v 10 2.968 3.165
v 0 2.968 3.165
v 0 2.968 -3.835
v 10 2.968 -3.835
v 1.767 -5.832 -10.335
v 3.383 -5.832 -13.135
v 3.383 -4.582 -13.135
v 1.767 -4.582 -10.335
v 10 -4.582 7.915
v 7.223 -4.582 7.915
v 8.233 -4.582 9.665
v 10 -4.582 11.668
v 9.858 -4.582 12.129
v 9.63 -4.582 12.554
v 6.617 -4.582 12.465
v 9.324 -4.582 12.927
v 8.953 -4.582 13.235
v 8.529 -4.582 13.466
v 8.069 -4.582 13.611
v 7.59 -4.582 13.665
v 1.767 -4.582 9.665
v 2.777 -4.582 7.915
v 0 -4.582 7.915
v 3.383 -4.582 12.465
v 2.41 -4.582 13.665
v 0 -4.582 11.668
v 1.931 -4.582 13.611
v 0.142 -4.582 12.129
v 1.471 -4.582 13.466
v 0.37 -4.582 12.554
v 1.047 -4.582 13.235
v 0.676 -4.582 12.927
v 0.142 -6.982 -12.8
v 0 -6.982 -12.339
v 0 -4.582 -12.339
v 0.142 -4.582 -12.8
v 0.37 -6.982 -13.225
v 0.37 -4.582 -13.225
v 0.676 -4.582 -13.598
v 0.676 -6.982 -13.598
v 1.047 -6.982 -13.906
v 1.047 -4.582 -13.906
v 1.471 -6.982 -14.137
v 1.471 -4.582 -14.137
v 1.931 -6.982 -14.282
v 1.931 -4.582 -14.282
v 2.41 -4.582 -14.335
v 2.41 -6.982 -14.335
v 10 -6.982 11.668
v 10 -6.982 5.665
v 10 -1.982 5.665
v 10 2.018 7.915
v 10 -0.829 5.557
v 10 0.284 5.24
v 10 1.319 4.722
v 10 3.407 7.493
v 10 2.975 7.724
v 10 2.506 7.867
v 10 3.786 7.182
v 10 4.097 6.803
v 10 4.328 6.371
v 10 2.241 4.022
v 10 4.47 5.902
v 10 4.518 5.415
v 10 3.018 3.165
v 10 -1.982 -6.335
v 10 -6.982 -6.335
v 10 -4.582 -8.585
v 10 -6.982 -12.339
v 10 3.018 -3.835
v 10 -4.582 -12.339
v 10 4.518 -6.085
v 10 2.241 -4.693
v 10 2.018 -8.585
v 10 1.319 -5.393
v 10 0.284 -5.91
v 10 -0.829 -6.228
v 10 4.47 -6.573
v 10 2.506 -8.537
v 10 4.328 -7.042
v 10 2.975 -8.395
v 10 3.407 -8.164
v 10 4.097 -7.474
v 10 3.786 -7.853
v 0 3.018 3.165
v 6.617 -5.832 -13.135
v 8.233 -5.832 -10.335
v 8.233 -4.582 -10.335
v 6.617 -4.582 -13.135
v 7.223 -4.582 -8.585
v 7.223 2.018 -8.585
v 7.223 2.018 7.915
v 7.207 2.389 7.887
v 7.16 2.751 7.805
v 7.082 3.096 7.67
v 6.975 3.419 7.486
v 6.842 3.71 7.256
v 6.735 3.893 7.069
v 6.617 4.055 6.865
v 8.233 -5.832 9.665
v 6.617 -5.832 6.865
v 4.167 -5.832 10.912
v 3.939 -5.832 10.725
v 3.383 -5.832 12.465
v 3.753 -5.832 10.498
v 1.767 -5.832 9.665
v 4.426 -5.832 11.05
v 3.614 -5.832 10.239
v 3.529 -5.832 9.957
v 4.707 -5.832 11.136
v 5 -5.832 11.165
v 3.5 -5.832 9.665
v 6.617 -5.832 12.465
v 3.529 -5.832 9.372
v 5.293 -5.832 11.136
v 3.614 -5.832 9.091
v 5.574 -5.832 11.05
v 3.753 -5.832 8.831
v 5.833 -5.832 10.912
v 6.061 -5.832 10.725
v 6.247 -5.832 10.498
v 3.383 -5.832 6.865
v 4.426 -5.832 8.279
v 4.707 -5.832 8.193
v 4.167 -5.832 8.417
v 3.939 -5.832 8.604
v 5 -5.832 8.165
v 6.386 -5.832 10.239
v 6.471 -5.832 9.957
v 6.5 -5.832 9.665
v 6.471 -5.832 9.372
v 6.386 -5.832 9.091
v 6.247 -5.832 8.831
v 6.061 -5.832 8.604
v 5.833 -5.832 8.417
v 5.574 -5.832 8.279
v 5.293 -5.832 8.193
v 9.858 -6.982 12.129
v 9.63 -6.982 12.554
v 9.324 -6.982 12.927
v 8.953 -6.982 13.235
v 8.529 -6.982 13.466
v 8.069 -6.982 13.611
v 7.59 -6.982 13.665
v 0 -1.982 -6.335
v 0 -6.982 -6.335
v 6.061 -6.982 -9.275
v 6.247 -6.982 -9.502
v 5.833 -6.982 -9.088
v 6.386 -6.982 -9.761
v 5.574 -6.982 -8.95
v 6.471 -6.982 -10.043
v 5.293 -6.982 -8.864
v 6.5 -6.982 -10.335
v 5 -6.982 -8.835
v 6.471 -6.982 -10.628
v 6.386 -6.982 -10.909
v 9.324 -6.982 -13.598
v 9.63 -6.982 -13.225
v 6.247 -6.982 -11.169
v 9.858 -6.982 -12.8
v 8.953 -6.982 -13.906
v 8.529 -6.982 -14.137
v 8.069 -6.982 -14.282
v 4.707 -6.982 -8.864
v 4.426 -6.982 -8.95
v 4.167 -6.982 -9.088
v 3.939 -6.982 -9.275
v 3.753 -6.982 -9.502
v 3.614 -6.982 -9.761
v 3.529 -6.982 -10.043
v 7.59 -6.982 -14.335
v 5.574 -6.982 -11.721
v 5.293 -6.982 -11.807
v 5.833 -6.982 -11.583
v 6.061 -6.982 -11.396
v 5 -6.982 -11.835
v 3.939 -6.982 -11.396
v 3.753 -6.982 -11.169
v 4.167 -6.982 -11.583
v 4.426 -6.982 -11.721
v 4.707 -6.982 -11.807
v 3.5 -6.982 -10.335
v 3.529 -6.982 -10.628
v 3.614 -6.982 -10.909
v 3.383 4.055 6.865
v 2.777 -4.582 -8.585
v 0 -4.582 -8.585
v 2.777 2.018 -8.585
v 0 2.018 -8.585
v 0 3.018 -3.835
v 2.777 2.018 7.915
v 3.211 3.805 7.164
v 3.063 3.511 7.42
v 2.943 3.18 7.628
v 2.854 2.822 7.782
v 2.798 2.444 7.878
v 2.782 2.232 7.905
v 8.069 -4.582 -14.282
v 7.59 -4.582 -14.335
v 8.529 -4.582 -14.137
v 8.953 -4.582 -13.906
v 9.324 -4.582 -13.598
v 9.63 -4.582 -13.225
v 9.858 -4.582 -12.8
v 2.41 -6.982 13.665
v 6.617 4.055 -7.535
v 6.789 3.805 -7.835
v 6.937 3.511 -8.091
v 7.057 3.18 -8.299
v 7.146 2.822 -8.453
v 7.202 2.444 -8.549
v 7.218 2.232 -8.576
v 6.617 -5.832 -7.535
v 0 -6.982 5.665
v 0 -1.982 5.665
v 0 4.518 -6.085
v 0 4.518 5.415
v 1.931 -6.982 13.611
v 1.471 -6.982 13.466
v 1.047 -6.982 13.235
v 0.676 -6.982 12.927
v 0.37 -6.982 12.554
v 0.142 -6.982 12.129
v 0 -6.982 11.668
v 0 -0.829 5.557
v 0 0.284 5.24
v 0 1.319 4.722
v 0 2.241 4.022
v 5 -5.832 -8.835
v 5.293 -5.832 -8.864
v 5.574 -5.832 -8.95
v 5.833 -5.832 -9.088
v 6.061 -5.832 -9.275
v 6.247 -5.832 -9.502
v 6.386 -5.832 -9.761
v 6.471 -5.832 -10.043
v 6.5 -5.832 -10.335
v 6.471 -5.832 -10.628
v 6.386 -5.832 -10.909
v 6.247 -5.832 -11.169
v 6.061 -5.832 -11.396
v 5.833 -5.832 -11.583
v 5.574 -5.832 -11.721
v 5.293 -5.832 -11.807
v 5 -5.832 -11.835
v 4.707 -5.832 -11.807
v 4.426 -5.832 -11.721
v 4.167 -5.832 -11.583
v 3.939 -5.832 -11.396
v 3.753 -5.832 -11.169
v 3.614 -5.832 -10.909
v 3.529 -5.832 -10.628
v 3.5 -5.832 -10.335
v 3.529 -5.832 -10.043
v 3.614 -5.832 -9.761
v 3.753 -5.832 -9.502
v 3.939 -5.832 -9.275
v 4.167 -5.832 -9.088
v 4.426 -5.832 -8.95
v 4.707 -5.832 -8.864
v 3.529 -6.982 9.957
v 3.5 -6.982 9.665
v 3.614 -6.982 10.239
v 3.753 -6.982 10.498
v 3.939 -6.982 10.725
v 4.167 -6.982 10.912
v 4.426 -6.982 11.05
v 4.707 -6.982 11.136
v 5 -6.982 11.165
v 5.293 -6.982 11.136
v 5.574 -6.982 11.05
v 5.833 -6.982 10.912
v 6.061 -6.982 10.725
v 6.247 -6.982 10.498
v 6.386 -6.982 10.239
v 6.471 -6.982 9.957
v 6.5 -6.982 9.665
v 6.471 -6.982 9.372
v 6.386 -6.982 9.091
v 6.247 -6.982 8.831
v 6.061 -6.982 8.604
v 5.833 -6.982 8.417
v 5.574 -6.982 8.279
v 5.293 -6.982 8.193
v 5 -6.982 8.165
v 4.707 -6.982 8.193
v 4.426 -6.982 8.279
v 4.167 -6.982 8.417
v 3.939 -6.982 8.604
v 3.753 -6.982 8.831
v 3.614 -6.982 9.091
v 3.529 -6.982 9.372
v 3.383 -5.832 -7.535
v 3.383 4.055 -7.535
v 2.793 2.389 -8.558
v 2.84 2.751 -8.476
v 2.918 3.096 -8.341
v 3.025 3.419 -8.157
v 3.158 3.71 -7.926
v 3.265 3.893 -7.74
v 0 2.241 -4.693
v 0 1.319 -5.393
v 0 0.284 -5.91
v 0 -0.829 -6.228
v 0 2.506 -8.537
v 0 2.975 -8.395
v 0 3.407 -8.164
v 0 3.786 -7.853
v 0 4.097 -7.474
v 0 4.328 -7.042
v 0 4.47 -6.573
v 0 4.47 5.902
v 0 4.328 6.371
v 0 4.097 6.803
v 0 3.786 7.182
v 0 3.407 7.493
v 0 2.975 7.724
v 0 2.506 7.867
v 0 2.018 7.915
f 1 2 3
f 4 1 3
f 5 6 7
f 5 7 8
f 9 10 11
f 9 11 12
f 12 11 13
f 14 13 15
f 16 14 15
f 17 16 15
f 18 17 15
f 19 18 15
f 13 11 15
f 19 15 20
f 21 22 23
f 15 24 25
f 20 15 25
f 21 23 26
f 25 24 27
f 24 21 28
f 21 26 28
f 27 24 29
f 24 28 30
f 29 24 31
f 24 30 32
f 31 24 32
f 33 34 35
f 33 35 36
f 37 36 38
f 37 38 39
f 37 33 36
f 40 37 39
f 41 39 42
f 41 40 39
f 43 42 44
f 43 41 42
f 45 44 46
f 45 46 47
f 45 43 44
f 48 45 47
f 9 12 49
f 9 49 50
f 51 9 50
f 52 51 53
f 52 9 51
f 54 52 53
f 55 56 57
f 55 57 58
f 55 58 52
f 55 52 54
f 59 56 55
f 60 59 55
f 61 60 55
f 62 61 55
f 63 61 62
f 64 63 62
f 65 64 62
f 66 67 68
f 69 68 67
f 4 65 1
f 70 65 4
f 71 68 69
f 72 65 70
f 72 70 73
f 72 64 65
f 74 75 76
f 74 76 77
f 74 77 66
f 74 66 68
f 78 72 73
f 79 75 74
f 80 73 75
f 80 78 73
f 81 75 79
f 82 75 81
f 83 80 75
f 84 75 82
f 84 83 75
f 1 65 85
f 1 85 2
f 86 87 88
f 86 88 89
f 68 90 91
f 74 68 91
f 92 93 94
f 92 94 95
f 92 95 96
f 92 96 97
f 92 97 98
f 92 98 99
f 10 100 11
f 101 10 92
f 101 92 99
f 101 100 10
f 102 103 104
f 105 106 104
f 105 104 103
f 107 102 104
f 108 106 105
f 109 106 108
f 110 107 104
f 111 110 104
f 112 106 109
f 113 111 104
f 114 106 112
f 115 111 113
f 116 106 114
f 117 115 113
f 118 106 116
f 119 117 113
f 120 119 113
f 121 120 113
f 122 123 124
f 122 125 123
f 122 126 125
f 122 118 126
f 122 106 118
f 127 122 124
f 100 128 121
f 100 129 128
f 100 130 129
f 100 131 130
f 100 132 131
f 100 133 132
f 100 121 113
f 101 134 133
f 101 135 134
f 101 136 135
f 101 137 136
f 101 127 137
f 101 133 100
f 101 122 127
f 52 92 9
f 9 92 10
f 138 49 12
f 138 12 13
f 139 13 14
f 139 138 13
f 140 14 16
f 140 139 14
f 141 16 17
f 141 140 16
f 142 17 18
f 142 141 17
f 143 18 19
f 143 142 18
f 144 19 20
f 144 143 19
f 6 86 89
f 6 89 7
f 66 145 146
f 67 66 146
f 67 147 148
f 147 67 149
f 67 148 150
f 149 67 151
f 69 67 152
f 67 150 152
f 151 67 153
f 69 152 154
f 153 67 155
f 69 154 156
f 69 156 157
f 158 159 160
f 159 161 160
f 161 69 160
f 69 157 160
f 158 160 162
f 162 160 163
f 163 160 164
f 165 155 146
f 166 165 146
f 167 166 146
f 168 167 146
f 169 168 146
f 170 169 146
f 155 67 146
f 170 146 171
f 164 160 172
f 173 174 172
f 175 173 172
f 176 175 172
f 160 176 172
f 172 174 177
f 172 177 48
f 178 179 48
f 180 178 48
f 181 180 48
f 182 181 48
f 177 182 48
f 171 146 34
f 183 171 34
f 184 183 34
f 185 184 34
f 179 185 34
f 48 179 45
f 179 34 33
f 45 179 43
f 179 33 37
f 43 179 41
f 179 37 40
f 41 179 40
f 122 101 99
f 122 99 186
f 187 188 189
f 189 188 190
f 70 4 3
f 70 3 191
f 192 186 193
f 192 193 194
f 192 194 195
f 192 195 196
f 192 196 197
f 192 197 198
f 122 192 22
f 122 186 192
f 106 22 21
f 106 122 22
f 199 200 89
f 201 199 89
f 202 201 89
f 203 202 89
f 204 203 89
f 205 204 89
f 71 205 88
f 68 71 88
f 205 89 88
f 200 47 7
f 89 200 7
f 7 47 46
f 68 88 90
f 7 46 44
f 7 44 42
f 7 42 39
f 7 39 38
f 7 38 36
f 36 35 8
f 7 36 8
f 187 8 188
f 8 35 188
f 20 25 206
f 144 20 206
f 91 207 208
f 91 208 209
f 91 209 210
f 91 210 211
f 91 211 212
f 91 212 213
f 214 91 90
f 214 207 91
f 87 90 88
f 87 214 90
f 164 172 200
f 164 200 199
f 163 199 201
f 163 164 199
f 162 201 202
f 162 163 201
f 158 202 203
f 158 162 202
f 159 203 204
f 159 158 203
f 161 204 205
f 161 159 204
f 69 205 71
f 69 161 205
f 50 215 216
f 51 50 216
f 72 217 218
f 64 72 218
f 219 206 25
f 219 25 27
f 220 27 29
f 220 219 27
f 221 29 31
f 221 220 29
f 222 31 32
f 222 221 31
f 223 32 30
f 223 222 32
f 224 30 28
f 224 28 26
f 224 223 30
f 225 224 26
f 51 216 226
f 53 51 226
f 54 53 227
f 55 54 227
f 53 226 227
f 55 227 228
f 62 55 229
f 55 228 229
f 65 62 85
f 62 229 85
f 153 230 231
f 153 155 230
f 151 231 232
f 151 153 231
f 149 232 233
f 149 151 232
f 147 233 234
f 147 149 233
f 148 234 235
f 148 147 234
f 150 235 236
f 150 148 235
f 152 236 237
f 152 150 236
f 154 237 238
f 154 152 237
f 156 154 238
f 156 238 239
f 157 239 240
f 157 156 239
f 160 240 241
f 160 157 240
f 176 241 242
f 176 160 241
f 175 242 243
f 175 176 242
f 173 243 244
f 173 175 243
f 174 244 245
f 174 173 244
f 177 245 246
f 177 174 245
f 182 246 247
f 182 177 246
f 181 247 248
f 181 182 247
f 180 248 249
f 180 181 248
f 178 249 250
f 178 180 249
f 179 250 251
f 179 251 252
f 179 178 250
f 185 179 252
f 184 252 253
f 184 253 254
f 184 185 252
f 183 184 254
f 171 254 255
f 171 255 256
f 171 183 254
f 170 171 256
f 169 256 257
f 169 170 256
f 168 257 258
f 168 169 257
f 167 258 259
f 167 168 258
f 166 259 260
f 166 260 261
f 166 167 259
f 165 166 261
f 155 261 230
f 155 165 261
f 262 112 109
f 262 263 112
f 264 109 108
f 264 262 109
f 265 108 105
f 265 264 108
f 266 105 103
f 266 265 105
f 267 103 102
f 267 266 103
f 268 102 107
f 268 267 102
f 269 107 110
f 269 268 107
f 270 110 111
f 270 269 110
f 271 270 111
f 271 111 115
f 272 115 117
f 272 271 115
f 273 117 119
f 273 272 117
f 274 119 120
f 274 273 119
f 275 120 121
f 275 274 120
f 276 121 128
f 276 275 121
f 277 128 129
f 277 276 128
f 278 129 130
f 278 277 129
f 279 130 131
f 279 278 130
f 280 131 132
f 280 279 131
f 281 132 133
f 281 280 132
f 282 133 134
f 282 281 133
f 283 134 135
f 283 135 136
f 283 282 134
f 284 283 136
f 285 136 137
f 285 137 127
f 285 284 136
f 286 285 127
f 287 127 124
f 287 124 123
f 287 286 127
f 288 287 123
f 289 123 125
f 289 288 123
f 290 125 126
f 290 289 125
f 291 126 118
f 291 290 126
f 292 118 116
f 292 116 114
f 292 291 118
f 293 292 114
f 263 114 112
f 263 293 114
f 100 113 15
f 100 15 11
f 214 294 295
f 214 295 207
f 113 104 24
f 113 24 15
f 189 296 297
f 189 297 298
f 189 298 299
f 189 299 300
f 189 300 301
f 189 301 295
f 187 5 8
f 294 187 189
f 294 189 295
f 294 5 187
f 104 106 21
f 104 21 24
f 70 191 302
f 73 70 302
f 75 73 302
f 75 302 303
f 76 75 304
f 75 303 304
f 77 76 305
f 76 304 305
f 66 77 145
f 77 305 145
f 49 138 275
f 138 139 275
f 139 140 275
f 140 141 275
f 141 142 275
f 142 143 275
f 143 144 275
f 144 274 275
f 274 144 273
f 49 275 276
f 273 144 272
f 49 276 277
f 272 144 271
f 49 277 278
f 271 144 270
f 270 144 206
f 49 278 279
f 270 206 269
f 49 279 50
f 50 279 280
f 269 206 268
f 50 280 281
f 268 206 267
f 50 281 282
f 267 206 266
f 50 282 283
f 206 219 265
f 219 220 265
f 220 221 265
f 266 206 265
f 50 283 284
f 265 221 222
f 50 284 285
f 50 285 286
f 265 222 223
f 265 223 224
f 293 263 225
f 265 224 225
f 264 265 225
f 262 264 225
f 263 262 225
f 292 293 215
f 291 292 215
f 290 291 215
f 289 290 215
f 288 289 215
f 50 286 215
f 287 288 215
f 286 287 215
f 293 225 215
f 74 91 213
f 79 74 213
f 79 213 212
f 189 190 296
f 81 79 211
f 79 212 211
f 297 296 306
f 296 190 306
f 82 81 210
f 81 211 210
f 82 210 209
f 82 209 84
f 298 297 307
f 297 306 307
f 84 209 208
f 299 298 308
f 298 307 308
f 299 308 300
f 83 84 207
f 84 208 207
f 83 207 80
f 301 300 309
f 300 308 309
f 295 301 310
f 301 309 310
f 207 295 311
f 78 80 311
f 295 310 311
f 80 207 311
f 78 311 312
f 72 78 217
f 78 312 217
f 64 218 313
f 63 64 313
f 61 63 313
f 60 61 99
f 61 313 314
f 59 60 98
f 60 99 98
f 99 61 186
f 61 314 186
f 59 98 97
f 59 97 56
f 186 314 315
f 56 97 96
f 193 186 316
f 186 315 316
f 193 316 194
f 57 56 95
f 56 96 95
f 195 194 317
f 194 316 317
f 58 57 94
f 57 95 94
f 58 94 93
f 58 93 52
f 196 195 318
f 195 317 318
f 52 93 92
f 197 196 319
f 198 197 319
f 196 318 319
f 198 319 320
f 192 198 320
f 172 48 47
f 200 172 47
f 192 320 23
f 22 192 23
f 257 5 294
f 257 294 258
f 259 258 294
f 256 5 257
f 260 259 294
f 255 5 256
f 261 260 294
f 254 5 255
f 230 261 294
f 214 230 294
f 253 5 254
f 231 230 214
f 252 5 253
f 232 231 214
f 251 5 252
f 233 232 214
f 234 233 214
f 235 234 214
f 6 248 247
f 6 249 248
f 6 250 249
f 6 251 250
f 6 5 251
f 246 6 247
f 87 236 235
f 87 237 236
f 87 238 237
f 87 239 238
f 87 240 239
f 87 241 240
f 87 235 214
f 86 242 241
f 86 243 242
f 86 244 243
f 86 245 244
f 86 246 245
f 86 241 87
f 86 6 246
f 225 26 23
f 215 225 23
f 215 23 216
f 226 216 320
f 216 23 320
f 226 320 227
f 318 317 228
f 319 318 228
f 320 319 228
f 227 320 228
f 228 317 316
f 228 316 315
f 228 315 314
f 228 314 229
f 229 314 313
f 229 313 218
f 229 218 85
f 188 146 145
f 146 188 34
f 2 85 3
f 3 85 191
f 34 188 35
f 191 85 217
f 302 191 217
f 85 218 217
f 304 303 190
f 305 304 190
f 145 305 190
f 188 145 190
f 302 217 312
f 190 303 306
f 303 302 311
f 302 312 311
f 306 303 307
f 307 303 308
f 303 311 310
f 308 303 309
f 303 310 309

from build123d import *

# Parameters (mm, degrees)
BOSS_EXTRUDE1_DEPTH     = 10
CUT_EXTRUDE1_DEPTH      = 25
CUT_EXTRUDE1_DEPTH_BACK = 1.25
SKETCH2_R               = 1.5
CUT_EXTRUDE2_START      = -20
SKETCH6_R               = 1.5
CUT_EXTRUDE2_DEPTH      = 20


with BuildPart() as part:
    # Sketch1 → Boss-Extrude1 (new body)
    with BuildSketch(Plane(origin=(0, 0, 0), x_dir=(0, 0, -1), z_dir=(1, 0, 0))):
        with BuildLine():
            ThreePointArc((-5.414542326, 4.518432939), (-7.182309279, 3.786199892), (-7.914542326, 2.018432939))
            Line((-7.914542326, 2.018432939), (-7.914542326, -4.581567061))
            Line((-7.914542326, -4.581567061), (-13.664542326, -4.581567061))
            Line((-13.664542326, -4.581567061), (-13.664542326, -6.981567061))
            Line((-13.664542326, -6.981567061), (-5.664542326, -6.981567061))
            Line((-5.664542326, -6.981567061), (-5.664542326, -1.981567074))
            ThreePointArc((-5.664542326, -1.981567074), (-5.004712273, 0.813517905), (-3.164542326, 3.018432939))
            Line((-3.164542326, 3.018432939), (-3.164542326, 2.968432939))
            Line((-3.164542326, 2.968432939), (3.835457674, 2.968432939))
            Line((3.835457674, 2.968432939), (3.835457674, 3.018432939))
            ThreePointArc((3.835457674, 3.018432939), (5.675627611, 0.813517924), (6.335457674, -1.981567032))
            Line((6.335457674, -1.981567032), (6.335457674, -6.981567061))
            Line((6.335457674, -6.981567061), (14.335457674, -6.981567061))
            Line((14.335457674, -6.981567061), (14.335457674, -4.581567061))
            Line((14.335457674, -4.581567061), (8.585457674, -4.581567061))
            Line((8.585457674, -4.581567061), (8.585457674, 2.018432939))
            ThreePointArc((8.585457674, 2.018432939), (7.853224626, 3.786199892), (6.085457674, 4.518432939))
            Line((6.085457674, 4.518432939), (-5.414542326, 4.518432939))
        make_face()
    extrude(amount=BOSS_EXTRUDE1_DEPTH)

    # Sketch2 → Cut-Extrude1 (cut, two sides: drawn at the far end of the back side and taken through both)
    # profile 1 of 2: a face of its own
    with BuildSketch(Plane(origin=(0, -4.581567061, 0), x_dir=(1, 0, 0), z_dir=(0, 1, 0)).offset(-CUT_EXTRUDE1_DEPTH_BACK)):
        Polygon((8.233161507, 10.335457674), (6.616580754, 13.135457674), (3.383419246, 13.135457674), (1.766838493, 10.335457674), (3.383419246, 7.535457674), (6.616580754, 7.535457674), align=None)
        with Locations((5, 10.335457674)):
            Circle(SKETCH2_R, mode=Mode.SUBTRACT)
    # profile 2 of 2: a face of its own
    with BuildSketch(Plane(origin=(0, -4.581567061, 0), x_dir=(1, 0, 0), z_dir=(0, 1, 0)).offset(-CUT_EXTRUDE1_DEPTH_BACK)):
        Polygon((8.233161507, -9.664542326), (6.616580754, -6.864542326), (3.383419246, -6.864542326), (1.766838493, -9.664542326), (3.383419246, -12.464542326), (6.616580754, -12.464542326), align=None)
        with Locations((5, -9.664542326)):
            Circle(SKETCH2_R, mode=Mode.SUBTRACT)
    extrude(amount=CUT_EXTRUDE1_DEPTH + CUT_EXTRUDE1_DEPTH_BACK, mode=Mode.SUBTRACT)

    # Sketch6 → Cut-Extrude2 (cut)
    with BuildSketch(Plane(origin=(0, -4.581567061, 0), x_dir=(1, 0, 0), z_dir=(0, 1, 0)).offset(CUT_EXTRUDE2_START)):
        with BuildLine():
            Line((2.410452351, 14.335457674), (0, 14.335457674))
            Line((0, 14.335457674), (0, 12.338937423))
            ThreePointArc((0, 12.338937423), (0.854129864, 13.761085526), (2.410452351, 14.335457674))
        make_face()
        with BuildLine():
            Line((10, 14.335457674), (7.589547649, 14.335457674))
            ThreePointArc((7.589547649, 14.335457674), (9.145870136, 13.761085526), (10, 12.338937423))
            Line((10, 12.338937423), (10, 14.335457674))
        make_face()
        with BuildLine():
            ThreePointArc((2.410452351, -13.664542326), (0.854129864, -13.090170179), (0, -11.668022076))
            Line((0, -11.668022076), (0, -13.664542326))
            Line((0, -13.664542326), (2.410452351, -13.664542326))
        make_face()
        with BuildLine():
            Line((10, -13.664542326), (10, -11.668022076))
            ThreePointArc((10, -11.668022076), (9.145870136, -13.090170179), (7.589547649, -13.664542326))
            Line((7.589547649, -13.664542326), (10, -13.664542326))
        make_face()
        with Locations((5, 10.335457674)):
            Circle(SKETCH6_R)
        with Locations((5, -9.664542326)):
            Circle(SKETCH6_R)
    extrude(amount=CUT_EXTRUDE2_DEPTH, mode=Mode.SUBTRACT)


solid = part.part
